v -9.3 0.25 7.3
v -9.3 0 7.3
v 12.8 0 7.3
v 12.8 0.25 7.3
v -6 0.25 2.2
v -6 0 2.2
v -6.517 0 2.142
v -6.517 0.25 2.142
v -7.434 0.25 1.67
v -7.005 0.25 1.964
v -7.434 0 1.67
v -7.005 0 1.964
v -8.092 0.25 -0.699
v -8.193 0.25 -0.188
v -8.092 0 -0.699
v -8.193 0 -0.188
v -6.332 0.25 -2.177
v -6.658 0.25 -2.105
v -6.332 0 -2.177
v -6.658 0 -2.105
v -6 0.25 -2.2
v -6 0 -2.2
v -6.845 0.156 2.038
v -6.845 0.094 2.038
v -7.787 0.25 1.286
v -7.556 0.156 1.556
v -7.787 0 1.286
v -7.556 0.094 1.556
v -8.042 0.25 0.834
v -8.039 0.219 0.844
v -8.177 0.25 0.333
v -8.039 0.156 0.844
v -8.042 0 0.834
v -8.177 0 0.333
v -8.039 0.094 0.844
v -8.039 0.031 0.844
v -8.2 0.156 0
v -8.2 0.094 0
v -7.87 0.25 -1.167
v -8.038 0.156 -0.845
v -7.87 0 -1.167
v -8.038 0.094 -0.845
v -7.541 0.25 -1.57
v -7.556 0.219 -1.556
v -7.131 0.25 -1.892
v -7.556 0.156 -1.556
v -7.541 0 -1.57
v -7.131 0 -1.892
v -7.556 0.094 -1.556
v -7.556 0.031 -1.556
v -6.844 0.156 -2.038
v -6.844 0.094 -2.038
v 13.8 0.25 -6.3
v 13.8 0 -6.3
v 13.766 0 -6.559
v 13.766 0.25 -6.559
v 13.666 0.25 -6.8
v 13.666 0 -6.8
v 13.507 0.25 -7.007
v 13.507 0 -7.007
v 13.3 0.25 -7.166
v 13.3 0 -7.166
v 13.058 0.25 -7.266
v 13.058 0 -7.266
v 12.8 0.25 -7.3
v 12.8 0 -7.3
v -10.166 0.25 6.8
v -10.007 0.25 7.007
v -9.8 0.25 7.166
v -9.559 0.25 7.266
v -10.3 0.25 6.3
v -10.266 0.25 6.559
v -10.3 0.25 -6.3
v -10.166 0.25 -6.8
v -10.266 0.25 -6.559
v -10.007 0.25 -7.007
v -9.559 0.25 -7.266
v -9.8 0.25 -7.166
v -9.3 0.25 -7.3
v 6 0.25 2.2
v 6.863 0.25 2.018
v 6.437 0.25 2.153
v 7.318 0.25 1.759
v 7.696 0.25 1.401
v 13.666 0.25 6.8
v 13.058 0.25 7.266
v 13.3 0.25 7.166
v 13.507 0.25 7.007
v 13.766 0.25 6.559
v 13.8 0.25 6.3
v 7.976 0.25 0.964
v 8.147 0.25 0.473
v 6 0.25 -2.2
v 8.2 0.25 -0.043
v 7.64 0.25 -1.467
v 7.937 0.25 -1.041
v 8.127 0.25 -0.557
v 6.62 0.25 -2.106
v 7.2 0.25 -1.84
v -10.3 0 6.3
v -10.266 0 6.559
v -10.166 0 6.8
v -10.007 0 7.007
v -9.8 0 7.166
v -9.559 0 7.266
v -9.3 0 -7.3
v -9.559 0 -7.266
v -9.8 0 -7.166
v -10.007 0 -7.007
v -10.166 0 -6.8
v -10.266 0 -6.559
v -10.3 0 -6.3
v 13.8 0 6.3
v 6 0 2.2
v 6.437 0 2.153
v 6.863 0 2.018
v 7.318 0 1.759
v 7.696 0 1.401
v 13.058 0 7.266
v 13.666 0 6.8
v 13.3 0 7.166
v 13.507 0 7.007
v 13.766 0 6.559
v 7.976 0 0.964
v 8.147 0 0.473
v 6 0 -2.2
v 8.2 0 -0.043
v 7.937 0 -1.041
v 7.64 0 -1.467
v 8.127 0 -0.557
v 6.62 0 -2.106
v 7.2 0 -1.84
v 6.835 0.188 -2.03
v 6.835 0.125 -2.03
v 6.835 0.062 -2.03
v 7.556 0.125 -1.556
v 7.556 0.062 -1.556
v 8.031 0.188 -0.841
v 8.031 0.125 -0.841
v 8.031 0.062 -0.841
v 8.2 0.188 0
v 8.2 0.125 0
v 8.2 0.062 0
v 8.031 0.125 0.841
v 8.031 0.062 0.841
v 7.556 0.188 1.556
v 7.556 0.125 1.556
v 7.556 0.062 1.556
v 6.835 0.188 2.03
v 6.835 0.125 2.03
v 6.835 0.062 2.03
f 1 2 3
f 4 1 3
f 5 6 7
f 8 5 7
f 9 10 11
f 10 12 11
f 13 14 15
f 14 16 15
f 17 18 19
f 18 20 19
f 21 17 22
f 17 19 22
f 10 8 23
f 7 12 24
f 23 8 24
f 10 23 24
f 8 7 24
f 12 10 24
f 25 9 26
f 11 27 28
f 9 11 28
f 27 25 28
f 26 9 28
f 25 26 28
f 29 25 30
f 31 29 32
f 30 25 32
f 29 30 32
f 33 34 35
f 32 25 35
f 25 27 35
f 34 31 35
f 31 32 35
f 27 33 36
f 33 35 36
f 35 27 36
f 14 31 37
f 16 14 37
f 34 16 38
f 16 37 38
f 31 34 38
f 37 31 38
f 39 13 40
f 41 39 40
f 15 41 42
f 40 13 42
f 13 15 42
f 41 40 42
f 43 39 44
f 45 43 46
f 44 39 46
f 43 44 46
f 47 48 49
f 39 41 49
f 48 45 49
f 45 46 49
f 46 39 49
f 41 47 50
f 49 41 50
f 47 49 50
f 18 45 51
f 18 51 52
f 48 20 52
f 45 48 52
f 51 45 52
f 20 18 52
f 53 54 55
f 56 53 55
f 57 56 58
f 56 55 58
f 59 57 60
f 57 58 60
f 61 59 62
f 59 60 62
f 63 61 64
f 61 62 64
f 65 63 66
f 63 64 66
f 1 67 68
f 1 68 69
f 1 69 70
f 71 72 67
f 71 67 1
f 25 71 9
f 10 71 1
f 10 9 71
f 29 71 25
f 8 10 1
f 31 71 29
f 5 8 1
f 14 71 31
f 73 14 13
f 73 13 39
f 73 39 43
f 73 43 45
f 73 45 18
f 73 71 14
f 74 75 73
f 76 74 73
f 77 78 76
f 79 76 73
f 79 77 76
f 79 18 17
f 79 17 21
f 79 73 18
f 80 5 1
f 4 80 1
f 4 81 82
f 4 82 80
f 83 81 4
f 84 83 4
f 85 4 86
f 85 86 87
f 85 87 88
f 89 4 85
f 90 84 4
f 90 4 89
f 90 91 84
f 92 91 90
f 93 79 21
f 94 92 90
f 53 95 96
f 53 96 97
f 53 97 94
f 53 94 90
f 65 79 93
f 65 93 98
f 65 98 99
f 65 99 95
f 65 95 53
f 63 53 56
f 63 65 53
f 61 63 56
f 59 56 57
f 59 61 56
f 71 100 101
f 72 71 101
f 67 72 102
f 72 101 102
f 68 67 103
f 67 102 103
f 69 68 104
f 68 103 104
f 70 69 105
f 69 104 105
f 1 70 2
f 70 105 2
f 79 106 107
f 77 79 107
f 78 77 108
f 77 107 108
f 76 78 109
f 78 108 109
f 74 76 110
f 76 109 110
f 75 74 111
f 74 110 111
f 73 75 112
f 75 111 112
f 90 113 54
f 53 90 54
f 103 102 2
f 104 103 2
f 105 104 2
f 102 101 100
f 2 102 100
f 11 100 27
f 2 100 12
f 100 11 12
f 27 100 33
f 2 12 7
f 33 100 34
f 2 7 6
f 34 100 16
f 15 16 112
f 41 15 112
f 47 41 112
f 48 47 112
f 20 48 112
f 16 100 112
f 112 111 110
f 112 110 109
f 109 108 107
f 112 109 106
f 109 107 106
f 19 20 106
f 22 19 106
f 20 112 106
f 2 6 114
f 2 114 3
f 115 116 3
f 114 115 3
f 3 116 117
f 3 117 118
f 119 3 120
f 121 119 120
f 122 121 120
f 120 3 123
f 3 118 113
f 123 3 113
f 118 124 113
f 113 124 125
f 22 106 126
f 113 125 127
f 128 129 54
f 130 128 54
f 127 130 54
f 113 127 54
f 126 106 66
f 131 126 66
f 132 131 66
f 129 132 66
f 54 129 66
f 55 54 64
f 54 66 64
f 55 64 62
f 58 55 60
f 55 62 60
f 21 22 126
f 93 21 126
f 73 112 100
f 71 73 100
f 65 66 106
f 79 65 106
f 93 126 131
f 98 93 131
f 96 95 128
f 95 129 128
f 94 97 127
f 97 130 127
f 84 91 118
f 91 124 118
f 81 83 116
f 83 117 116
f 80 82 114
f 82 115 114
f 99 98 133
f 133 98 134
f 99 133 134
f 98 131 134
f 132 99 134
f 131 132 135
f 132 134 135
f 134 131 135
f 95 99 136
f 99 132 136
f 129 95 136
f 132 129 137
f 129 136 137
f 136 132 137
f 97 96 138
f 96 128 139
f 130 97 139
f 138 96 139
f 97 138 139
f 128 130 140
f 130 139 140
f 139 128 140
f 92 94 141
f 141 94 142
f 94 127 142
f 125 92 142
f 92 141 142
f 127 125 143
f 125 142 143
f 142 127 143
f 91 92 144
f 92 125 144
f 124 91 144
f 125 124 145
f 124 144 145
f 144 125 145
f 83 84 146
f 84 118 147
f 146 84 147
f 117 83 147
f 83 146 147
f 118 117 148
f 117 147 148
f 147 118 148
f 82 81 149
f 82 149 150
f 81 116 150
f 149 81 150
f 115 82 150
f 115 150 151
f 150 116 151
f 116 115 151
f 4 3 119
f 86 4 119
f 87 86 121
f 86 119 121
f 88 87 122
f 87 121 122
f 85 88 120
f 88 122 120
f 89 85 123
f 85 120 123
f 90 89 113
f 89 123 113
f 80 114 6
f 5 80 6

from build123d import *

# Parameters (mm, degrees)
BOSS_EXTRUDE1_DEPTH = 0.25


with BuildPart() as part:
    # Sketch1 → Boss-Extrude1 (new body)
    with BuildSketch(Plane(origin=(0, 0, 0), x_dir=(1, 0, 0), z_dir=(0, 1, 0))):
        with BuildLine():
            Line((12.799624508, 7.3), (-9.300375492, 7.3))
            ThreePointArc((-9.300375492, 7.3), (-10.007482273, 7.007106781), (-10.300375492, 6.3))
            Line((-10.300375492, 6.3), (-10.300375492, -6.3))
            ThreePointArc((-10.300375492, -6.3), (-10.007482273, -7.007106781), (-9.300375492, -7.3))
            Line((-9.300375492, -7.3), (12.799624508, -7.3))
            ThreePointArc((12.799624508, -7.3), (13.506731289, -7.007106781), (13.799624508, -6.3))
            Line((13.799624508, -6.3), (13.799624508, 6.3))
            ThreePointArc((13.799624508, 6.3), (13.506731289, 7.007106781), (12.799624508, 7.3))
        make_face()
        with BuildLine():
            Line((-6, 2.2), (6, 2.2))
            add(Edge.make_bspline(
                [(6, 2.2), (6.561292129, 2.2), (7.730716323, 1.723876992), (8.434682325, -7.8217e-05), (7.730554293, -1.724014124), (6.561245935, -2.2), (6, -2.2)],
                knots=[0, 0, 0, 0, 0.25, 0.5, 0.75, 1, 1, 1, 1], degree=3))
            Line((6, -2.2), (-6, -2.2))
            add(Edge.make_bspline(
                [(-6, -2.2), (-6.286632035, -2.2), (-6.870184339, -2.096470778), (-7.591774941, -1.592328061), (-8.096898813, -0.867652922), (-8.251698338, -0.000240671), (-8.096307718, 0.869143795), (-7.591951498, 1.592127779), (-6.869322234, 2.096528001), (-6.286463211, 2.2), (-6, 2.2)],
                knots=[0, 0, 0, 0, 0.125, 0.25, 0.375, 0.5, 0.625, 0.75, 0.875, 1, 1, 1, 1], degree=3))
        make_face(mode=Mode.SUBTRACT)
    extrude(amount=BOSS_EXTRUDE1_DEPTH)


solid = part.part
